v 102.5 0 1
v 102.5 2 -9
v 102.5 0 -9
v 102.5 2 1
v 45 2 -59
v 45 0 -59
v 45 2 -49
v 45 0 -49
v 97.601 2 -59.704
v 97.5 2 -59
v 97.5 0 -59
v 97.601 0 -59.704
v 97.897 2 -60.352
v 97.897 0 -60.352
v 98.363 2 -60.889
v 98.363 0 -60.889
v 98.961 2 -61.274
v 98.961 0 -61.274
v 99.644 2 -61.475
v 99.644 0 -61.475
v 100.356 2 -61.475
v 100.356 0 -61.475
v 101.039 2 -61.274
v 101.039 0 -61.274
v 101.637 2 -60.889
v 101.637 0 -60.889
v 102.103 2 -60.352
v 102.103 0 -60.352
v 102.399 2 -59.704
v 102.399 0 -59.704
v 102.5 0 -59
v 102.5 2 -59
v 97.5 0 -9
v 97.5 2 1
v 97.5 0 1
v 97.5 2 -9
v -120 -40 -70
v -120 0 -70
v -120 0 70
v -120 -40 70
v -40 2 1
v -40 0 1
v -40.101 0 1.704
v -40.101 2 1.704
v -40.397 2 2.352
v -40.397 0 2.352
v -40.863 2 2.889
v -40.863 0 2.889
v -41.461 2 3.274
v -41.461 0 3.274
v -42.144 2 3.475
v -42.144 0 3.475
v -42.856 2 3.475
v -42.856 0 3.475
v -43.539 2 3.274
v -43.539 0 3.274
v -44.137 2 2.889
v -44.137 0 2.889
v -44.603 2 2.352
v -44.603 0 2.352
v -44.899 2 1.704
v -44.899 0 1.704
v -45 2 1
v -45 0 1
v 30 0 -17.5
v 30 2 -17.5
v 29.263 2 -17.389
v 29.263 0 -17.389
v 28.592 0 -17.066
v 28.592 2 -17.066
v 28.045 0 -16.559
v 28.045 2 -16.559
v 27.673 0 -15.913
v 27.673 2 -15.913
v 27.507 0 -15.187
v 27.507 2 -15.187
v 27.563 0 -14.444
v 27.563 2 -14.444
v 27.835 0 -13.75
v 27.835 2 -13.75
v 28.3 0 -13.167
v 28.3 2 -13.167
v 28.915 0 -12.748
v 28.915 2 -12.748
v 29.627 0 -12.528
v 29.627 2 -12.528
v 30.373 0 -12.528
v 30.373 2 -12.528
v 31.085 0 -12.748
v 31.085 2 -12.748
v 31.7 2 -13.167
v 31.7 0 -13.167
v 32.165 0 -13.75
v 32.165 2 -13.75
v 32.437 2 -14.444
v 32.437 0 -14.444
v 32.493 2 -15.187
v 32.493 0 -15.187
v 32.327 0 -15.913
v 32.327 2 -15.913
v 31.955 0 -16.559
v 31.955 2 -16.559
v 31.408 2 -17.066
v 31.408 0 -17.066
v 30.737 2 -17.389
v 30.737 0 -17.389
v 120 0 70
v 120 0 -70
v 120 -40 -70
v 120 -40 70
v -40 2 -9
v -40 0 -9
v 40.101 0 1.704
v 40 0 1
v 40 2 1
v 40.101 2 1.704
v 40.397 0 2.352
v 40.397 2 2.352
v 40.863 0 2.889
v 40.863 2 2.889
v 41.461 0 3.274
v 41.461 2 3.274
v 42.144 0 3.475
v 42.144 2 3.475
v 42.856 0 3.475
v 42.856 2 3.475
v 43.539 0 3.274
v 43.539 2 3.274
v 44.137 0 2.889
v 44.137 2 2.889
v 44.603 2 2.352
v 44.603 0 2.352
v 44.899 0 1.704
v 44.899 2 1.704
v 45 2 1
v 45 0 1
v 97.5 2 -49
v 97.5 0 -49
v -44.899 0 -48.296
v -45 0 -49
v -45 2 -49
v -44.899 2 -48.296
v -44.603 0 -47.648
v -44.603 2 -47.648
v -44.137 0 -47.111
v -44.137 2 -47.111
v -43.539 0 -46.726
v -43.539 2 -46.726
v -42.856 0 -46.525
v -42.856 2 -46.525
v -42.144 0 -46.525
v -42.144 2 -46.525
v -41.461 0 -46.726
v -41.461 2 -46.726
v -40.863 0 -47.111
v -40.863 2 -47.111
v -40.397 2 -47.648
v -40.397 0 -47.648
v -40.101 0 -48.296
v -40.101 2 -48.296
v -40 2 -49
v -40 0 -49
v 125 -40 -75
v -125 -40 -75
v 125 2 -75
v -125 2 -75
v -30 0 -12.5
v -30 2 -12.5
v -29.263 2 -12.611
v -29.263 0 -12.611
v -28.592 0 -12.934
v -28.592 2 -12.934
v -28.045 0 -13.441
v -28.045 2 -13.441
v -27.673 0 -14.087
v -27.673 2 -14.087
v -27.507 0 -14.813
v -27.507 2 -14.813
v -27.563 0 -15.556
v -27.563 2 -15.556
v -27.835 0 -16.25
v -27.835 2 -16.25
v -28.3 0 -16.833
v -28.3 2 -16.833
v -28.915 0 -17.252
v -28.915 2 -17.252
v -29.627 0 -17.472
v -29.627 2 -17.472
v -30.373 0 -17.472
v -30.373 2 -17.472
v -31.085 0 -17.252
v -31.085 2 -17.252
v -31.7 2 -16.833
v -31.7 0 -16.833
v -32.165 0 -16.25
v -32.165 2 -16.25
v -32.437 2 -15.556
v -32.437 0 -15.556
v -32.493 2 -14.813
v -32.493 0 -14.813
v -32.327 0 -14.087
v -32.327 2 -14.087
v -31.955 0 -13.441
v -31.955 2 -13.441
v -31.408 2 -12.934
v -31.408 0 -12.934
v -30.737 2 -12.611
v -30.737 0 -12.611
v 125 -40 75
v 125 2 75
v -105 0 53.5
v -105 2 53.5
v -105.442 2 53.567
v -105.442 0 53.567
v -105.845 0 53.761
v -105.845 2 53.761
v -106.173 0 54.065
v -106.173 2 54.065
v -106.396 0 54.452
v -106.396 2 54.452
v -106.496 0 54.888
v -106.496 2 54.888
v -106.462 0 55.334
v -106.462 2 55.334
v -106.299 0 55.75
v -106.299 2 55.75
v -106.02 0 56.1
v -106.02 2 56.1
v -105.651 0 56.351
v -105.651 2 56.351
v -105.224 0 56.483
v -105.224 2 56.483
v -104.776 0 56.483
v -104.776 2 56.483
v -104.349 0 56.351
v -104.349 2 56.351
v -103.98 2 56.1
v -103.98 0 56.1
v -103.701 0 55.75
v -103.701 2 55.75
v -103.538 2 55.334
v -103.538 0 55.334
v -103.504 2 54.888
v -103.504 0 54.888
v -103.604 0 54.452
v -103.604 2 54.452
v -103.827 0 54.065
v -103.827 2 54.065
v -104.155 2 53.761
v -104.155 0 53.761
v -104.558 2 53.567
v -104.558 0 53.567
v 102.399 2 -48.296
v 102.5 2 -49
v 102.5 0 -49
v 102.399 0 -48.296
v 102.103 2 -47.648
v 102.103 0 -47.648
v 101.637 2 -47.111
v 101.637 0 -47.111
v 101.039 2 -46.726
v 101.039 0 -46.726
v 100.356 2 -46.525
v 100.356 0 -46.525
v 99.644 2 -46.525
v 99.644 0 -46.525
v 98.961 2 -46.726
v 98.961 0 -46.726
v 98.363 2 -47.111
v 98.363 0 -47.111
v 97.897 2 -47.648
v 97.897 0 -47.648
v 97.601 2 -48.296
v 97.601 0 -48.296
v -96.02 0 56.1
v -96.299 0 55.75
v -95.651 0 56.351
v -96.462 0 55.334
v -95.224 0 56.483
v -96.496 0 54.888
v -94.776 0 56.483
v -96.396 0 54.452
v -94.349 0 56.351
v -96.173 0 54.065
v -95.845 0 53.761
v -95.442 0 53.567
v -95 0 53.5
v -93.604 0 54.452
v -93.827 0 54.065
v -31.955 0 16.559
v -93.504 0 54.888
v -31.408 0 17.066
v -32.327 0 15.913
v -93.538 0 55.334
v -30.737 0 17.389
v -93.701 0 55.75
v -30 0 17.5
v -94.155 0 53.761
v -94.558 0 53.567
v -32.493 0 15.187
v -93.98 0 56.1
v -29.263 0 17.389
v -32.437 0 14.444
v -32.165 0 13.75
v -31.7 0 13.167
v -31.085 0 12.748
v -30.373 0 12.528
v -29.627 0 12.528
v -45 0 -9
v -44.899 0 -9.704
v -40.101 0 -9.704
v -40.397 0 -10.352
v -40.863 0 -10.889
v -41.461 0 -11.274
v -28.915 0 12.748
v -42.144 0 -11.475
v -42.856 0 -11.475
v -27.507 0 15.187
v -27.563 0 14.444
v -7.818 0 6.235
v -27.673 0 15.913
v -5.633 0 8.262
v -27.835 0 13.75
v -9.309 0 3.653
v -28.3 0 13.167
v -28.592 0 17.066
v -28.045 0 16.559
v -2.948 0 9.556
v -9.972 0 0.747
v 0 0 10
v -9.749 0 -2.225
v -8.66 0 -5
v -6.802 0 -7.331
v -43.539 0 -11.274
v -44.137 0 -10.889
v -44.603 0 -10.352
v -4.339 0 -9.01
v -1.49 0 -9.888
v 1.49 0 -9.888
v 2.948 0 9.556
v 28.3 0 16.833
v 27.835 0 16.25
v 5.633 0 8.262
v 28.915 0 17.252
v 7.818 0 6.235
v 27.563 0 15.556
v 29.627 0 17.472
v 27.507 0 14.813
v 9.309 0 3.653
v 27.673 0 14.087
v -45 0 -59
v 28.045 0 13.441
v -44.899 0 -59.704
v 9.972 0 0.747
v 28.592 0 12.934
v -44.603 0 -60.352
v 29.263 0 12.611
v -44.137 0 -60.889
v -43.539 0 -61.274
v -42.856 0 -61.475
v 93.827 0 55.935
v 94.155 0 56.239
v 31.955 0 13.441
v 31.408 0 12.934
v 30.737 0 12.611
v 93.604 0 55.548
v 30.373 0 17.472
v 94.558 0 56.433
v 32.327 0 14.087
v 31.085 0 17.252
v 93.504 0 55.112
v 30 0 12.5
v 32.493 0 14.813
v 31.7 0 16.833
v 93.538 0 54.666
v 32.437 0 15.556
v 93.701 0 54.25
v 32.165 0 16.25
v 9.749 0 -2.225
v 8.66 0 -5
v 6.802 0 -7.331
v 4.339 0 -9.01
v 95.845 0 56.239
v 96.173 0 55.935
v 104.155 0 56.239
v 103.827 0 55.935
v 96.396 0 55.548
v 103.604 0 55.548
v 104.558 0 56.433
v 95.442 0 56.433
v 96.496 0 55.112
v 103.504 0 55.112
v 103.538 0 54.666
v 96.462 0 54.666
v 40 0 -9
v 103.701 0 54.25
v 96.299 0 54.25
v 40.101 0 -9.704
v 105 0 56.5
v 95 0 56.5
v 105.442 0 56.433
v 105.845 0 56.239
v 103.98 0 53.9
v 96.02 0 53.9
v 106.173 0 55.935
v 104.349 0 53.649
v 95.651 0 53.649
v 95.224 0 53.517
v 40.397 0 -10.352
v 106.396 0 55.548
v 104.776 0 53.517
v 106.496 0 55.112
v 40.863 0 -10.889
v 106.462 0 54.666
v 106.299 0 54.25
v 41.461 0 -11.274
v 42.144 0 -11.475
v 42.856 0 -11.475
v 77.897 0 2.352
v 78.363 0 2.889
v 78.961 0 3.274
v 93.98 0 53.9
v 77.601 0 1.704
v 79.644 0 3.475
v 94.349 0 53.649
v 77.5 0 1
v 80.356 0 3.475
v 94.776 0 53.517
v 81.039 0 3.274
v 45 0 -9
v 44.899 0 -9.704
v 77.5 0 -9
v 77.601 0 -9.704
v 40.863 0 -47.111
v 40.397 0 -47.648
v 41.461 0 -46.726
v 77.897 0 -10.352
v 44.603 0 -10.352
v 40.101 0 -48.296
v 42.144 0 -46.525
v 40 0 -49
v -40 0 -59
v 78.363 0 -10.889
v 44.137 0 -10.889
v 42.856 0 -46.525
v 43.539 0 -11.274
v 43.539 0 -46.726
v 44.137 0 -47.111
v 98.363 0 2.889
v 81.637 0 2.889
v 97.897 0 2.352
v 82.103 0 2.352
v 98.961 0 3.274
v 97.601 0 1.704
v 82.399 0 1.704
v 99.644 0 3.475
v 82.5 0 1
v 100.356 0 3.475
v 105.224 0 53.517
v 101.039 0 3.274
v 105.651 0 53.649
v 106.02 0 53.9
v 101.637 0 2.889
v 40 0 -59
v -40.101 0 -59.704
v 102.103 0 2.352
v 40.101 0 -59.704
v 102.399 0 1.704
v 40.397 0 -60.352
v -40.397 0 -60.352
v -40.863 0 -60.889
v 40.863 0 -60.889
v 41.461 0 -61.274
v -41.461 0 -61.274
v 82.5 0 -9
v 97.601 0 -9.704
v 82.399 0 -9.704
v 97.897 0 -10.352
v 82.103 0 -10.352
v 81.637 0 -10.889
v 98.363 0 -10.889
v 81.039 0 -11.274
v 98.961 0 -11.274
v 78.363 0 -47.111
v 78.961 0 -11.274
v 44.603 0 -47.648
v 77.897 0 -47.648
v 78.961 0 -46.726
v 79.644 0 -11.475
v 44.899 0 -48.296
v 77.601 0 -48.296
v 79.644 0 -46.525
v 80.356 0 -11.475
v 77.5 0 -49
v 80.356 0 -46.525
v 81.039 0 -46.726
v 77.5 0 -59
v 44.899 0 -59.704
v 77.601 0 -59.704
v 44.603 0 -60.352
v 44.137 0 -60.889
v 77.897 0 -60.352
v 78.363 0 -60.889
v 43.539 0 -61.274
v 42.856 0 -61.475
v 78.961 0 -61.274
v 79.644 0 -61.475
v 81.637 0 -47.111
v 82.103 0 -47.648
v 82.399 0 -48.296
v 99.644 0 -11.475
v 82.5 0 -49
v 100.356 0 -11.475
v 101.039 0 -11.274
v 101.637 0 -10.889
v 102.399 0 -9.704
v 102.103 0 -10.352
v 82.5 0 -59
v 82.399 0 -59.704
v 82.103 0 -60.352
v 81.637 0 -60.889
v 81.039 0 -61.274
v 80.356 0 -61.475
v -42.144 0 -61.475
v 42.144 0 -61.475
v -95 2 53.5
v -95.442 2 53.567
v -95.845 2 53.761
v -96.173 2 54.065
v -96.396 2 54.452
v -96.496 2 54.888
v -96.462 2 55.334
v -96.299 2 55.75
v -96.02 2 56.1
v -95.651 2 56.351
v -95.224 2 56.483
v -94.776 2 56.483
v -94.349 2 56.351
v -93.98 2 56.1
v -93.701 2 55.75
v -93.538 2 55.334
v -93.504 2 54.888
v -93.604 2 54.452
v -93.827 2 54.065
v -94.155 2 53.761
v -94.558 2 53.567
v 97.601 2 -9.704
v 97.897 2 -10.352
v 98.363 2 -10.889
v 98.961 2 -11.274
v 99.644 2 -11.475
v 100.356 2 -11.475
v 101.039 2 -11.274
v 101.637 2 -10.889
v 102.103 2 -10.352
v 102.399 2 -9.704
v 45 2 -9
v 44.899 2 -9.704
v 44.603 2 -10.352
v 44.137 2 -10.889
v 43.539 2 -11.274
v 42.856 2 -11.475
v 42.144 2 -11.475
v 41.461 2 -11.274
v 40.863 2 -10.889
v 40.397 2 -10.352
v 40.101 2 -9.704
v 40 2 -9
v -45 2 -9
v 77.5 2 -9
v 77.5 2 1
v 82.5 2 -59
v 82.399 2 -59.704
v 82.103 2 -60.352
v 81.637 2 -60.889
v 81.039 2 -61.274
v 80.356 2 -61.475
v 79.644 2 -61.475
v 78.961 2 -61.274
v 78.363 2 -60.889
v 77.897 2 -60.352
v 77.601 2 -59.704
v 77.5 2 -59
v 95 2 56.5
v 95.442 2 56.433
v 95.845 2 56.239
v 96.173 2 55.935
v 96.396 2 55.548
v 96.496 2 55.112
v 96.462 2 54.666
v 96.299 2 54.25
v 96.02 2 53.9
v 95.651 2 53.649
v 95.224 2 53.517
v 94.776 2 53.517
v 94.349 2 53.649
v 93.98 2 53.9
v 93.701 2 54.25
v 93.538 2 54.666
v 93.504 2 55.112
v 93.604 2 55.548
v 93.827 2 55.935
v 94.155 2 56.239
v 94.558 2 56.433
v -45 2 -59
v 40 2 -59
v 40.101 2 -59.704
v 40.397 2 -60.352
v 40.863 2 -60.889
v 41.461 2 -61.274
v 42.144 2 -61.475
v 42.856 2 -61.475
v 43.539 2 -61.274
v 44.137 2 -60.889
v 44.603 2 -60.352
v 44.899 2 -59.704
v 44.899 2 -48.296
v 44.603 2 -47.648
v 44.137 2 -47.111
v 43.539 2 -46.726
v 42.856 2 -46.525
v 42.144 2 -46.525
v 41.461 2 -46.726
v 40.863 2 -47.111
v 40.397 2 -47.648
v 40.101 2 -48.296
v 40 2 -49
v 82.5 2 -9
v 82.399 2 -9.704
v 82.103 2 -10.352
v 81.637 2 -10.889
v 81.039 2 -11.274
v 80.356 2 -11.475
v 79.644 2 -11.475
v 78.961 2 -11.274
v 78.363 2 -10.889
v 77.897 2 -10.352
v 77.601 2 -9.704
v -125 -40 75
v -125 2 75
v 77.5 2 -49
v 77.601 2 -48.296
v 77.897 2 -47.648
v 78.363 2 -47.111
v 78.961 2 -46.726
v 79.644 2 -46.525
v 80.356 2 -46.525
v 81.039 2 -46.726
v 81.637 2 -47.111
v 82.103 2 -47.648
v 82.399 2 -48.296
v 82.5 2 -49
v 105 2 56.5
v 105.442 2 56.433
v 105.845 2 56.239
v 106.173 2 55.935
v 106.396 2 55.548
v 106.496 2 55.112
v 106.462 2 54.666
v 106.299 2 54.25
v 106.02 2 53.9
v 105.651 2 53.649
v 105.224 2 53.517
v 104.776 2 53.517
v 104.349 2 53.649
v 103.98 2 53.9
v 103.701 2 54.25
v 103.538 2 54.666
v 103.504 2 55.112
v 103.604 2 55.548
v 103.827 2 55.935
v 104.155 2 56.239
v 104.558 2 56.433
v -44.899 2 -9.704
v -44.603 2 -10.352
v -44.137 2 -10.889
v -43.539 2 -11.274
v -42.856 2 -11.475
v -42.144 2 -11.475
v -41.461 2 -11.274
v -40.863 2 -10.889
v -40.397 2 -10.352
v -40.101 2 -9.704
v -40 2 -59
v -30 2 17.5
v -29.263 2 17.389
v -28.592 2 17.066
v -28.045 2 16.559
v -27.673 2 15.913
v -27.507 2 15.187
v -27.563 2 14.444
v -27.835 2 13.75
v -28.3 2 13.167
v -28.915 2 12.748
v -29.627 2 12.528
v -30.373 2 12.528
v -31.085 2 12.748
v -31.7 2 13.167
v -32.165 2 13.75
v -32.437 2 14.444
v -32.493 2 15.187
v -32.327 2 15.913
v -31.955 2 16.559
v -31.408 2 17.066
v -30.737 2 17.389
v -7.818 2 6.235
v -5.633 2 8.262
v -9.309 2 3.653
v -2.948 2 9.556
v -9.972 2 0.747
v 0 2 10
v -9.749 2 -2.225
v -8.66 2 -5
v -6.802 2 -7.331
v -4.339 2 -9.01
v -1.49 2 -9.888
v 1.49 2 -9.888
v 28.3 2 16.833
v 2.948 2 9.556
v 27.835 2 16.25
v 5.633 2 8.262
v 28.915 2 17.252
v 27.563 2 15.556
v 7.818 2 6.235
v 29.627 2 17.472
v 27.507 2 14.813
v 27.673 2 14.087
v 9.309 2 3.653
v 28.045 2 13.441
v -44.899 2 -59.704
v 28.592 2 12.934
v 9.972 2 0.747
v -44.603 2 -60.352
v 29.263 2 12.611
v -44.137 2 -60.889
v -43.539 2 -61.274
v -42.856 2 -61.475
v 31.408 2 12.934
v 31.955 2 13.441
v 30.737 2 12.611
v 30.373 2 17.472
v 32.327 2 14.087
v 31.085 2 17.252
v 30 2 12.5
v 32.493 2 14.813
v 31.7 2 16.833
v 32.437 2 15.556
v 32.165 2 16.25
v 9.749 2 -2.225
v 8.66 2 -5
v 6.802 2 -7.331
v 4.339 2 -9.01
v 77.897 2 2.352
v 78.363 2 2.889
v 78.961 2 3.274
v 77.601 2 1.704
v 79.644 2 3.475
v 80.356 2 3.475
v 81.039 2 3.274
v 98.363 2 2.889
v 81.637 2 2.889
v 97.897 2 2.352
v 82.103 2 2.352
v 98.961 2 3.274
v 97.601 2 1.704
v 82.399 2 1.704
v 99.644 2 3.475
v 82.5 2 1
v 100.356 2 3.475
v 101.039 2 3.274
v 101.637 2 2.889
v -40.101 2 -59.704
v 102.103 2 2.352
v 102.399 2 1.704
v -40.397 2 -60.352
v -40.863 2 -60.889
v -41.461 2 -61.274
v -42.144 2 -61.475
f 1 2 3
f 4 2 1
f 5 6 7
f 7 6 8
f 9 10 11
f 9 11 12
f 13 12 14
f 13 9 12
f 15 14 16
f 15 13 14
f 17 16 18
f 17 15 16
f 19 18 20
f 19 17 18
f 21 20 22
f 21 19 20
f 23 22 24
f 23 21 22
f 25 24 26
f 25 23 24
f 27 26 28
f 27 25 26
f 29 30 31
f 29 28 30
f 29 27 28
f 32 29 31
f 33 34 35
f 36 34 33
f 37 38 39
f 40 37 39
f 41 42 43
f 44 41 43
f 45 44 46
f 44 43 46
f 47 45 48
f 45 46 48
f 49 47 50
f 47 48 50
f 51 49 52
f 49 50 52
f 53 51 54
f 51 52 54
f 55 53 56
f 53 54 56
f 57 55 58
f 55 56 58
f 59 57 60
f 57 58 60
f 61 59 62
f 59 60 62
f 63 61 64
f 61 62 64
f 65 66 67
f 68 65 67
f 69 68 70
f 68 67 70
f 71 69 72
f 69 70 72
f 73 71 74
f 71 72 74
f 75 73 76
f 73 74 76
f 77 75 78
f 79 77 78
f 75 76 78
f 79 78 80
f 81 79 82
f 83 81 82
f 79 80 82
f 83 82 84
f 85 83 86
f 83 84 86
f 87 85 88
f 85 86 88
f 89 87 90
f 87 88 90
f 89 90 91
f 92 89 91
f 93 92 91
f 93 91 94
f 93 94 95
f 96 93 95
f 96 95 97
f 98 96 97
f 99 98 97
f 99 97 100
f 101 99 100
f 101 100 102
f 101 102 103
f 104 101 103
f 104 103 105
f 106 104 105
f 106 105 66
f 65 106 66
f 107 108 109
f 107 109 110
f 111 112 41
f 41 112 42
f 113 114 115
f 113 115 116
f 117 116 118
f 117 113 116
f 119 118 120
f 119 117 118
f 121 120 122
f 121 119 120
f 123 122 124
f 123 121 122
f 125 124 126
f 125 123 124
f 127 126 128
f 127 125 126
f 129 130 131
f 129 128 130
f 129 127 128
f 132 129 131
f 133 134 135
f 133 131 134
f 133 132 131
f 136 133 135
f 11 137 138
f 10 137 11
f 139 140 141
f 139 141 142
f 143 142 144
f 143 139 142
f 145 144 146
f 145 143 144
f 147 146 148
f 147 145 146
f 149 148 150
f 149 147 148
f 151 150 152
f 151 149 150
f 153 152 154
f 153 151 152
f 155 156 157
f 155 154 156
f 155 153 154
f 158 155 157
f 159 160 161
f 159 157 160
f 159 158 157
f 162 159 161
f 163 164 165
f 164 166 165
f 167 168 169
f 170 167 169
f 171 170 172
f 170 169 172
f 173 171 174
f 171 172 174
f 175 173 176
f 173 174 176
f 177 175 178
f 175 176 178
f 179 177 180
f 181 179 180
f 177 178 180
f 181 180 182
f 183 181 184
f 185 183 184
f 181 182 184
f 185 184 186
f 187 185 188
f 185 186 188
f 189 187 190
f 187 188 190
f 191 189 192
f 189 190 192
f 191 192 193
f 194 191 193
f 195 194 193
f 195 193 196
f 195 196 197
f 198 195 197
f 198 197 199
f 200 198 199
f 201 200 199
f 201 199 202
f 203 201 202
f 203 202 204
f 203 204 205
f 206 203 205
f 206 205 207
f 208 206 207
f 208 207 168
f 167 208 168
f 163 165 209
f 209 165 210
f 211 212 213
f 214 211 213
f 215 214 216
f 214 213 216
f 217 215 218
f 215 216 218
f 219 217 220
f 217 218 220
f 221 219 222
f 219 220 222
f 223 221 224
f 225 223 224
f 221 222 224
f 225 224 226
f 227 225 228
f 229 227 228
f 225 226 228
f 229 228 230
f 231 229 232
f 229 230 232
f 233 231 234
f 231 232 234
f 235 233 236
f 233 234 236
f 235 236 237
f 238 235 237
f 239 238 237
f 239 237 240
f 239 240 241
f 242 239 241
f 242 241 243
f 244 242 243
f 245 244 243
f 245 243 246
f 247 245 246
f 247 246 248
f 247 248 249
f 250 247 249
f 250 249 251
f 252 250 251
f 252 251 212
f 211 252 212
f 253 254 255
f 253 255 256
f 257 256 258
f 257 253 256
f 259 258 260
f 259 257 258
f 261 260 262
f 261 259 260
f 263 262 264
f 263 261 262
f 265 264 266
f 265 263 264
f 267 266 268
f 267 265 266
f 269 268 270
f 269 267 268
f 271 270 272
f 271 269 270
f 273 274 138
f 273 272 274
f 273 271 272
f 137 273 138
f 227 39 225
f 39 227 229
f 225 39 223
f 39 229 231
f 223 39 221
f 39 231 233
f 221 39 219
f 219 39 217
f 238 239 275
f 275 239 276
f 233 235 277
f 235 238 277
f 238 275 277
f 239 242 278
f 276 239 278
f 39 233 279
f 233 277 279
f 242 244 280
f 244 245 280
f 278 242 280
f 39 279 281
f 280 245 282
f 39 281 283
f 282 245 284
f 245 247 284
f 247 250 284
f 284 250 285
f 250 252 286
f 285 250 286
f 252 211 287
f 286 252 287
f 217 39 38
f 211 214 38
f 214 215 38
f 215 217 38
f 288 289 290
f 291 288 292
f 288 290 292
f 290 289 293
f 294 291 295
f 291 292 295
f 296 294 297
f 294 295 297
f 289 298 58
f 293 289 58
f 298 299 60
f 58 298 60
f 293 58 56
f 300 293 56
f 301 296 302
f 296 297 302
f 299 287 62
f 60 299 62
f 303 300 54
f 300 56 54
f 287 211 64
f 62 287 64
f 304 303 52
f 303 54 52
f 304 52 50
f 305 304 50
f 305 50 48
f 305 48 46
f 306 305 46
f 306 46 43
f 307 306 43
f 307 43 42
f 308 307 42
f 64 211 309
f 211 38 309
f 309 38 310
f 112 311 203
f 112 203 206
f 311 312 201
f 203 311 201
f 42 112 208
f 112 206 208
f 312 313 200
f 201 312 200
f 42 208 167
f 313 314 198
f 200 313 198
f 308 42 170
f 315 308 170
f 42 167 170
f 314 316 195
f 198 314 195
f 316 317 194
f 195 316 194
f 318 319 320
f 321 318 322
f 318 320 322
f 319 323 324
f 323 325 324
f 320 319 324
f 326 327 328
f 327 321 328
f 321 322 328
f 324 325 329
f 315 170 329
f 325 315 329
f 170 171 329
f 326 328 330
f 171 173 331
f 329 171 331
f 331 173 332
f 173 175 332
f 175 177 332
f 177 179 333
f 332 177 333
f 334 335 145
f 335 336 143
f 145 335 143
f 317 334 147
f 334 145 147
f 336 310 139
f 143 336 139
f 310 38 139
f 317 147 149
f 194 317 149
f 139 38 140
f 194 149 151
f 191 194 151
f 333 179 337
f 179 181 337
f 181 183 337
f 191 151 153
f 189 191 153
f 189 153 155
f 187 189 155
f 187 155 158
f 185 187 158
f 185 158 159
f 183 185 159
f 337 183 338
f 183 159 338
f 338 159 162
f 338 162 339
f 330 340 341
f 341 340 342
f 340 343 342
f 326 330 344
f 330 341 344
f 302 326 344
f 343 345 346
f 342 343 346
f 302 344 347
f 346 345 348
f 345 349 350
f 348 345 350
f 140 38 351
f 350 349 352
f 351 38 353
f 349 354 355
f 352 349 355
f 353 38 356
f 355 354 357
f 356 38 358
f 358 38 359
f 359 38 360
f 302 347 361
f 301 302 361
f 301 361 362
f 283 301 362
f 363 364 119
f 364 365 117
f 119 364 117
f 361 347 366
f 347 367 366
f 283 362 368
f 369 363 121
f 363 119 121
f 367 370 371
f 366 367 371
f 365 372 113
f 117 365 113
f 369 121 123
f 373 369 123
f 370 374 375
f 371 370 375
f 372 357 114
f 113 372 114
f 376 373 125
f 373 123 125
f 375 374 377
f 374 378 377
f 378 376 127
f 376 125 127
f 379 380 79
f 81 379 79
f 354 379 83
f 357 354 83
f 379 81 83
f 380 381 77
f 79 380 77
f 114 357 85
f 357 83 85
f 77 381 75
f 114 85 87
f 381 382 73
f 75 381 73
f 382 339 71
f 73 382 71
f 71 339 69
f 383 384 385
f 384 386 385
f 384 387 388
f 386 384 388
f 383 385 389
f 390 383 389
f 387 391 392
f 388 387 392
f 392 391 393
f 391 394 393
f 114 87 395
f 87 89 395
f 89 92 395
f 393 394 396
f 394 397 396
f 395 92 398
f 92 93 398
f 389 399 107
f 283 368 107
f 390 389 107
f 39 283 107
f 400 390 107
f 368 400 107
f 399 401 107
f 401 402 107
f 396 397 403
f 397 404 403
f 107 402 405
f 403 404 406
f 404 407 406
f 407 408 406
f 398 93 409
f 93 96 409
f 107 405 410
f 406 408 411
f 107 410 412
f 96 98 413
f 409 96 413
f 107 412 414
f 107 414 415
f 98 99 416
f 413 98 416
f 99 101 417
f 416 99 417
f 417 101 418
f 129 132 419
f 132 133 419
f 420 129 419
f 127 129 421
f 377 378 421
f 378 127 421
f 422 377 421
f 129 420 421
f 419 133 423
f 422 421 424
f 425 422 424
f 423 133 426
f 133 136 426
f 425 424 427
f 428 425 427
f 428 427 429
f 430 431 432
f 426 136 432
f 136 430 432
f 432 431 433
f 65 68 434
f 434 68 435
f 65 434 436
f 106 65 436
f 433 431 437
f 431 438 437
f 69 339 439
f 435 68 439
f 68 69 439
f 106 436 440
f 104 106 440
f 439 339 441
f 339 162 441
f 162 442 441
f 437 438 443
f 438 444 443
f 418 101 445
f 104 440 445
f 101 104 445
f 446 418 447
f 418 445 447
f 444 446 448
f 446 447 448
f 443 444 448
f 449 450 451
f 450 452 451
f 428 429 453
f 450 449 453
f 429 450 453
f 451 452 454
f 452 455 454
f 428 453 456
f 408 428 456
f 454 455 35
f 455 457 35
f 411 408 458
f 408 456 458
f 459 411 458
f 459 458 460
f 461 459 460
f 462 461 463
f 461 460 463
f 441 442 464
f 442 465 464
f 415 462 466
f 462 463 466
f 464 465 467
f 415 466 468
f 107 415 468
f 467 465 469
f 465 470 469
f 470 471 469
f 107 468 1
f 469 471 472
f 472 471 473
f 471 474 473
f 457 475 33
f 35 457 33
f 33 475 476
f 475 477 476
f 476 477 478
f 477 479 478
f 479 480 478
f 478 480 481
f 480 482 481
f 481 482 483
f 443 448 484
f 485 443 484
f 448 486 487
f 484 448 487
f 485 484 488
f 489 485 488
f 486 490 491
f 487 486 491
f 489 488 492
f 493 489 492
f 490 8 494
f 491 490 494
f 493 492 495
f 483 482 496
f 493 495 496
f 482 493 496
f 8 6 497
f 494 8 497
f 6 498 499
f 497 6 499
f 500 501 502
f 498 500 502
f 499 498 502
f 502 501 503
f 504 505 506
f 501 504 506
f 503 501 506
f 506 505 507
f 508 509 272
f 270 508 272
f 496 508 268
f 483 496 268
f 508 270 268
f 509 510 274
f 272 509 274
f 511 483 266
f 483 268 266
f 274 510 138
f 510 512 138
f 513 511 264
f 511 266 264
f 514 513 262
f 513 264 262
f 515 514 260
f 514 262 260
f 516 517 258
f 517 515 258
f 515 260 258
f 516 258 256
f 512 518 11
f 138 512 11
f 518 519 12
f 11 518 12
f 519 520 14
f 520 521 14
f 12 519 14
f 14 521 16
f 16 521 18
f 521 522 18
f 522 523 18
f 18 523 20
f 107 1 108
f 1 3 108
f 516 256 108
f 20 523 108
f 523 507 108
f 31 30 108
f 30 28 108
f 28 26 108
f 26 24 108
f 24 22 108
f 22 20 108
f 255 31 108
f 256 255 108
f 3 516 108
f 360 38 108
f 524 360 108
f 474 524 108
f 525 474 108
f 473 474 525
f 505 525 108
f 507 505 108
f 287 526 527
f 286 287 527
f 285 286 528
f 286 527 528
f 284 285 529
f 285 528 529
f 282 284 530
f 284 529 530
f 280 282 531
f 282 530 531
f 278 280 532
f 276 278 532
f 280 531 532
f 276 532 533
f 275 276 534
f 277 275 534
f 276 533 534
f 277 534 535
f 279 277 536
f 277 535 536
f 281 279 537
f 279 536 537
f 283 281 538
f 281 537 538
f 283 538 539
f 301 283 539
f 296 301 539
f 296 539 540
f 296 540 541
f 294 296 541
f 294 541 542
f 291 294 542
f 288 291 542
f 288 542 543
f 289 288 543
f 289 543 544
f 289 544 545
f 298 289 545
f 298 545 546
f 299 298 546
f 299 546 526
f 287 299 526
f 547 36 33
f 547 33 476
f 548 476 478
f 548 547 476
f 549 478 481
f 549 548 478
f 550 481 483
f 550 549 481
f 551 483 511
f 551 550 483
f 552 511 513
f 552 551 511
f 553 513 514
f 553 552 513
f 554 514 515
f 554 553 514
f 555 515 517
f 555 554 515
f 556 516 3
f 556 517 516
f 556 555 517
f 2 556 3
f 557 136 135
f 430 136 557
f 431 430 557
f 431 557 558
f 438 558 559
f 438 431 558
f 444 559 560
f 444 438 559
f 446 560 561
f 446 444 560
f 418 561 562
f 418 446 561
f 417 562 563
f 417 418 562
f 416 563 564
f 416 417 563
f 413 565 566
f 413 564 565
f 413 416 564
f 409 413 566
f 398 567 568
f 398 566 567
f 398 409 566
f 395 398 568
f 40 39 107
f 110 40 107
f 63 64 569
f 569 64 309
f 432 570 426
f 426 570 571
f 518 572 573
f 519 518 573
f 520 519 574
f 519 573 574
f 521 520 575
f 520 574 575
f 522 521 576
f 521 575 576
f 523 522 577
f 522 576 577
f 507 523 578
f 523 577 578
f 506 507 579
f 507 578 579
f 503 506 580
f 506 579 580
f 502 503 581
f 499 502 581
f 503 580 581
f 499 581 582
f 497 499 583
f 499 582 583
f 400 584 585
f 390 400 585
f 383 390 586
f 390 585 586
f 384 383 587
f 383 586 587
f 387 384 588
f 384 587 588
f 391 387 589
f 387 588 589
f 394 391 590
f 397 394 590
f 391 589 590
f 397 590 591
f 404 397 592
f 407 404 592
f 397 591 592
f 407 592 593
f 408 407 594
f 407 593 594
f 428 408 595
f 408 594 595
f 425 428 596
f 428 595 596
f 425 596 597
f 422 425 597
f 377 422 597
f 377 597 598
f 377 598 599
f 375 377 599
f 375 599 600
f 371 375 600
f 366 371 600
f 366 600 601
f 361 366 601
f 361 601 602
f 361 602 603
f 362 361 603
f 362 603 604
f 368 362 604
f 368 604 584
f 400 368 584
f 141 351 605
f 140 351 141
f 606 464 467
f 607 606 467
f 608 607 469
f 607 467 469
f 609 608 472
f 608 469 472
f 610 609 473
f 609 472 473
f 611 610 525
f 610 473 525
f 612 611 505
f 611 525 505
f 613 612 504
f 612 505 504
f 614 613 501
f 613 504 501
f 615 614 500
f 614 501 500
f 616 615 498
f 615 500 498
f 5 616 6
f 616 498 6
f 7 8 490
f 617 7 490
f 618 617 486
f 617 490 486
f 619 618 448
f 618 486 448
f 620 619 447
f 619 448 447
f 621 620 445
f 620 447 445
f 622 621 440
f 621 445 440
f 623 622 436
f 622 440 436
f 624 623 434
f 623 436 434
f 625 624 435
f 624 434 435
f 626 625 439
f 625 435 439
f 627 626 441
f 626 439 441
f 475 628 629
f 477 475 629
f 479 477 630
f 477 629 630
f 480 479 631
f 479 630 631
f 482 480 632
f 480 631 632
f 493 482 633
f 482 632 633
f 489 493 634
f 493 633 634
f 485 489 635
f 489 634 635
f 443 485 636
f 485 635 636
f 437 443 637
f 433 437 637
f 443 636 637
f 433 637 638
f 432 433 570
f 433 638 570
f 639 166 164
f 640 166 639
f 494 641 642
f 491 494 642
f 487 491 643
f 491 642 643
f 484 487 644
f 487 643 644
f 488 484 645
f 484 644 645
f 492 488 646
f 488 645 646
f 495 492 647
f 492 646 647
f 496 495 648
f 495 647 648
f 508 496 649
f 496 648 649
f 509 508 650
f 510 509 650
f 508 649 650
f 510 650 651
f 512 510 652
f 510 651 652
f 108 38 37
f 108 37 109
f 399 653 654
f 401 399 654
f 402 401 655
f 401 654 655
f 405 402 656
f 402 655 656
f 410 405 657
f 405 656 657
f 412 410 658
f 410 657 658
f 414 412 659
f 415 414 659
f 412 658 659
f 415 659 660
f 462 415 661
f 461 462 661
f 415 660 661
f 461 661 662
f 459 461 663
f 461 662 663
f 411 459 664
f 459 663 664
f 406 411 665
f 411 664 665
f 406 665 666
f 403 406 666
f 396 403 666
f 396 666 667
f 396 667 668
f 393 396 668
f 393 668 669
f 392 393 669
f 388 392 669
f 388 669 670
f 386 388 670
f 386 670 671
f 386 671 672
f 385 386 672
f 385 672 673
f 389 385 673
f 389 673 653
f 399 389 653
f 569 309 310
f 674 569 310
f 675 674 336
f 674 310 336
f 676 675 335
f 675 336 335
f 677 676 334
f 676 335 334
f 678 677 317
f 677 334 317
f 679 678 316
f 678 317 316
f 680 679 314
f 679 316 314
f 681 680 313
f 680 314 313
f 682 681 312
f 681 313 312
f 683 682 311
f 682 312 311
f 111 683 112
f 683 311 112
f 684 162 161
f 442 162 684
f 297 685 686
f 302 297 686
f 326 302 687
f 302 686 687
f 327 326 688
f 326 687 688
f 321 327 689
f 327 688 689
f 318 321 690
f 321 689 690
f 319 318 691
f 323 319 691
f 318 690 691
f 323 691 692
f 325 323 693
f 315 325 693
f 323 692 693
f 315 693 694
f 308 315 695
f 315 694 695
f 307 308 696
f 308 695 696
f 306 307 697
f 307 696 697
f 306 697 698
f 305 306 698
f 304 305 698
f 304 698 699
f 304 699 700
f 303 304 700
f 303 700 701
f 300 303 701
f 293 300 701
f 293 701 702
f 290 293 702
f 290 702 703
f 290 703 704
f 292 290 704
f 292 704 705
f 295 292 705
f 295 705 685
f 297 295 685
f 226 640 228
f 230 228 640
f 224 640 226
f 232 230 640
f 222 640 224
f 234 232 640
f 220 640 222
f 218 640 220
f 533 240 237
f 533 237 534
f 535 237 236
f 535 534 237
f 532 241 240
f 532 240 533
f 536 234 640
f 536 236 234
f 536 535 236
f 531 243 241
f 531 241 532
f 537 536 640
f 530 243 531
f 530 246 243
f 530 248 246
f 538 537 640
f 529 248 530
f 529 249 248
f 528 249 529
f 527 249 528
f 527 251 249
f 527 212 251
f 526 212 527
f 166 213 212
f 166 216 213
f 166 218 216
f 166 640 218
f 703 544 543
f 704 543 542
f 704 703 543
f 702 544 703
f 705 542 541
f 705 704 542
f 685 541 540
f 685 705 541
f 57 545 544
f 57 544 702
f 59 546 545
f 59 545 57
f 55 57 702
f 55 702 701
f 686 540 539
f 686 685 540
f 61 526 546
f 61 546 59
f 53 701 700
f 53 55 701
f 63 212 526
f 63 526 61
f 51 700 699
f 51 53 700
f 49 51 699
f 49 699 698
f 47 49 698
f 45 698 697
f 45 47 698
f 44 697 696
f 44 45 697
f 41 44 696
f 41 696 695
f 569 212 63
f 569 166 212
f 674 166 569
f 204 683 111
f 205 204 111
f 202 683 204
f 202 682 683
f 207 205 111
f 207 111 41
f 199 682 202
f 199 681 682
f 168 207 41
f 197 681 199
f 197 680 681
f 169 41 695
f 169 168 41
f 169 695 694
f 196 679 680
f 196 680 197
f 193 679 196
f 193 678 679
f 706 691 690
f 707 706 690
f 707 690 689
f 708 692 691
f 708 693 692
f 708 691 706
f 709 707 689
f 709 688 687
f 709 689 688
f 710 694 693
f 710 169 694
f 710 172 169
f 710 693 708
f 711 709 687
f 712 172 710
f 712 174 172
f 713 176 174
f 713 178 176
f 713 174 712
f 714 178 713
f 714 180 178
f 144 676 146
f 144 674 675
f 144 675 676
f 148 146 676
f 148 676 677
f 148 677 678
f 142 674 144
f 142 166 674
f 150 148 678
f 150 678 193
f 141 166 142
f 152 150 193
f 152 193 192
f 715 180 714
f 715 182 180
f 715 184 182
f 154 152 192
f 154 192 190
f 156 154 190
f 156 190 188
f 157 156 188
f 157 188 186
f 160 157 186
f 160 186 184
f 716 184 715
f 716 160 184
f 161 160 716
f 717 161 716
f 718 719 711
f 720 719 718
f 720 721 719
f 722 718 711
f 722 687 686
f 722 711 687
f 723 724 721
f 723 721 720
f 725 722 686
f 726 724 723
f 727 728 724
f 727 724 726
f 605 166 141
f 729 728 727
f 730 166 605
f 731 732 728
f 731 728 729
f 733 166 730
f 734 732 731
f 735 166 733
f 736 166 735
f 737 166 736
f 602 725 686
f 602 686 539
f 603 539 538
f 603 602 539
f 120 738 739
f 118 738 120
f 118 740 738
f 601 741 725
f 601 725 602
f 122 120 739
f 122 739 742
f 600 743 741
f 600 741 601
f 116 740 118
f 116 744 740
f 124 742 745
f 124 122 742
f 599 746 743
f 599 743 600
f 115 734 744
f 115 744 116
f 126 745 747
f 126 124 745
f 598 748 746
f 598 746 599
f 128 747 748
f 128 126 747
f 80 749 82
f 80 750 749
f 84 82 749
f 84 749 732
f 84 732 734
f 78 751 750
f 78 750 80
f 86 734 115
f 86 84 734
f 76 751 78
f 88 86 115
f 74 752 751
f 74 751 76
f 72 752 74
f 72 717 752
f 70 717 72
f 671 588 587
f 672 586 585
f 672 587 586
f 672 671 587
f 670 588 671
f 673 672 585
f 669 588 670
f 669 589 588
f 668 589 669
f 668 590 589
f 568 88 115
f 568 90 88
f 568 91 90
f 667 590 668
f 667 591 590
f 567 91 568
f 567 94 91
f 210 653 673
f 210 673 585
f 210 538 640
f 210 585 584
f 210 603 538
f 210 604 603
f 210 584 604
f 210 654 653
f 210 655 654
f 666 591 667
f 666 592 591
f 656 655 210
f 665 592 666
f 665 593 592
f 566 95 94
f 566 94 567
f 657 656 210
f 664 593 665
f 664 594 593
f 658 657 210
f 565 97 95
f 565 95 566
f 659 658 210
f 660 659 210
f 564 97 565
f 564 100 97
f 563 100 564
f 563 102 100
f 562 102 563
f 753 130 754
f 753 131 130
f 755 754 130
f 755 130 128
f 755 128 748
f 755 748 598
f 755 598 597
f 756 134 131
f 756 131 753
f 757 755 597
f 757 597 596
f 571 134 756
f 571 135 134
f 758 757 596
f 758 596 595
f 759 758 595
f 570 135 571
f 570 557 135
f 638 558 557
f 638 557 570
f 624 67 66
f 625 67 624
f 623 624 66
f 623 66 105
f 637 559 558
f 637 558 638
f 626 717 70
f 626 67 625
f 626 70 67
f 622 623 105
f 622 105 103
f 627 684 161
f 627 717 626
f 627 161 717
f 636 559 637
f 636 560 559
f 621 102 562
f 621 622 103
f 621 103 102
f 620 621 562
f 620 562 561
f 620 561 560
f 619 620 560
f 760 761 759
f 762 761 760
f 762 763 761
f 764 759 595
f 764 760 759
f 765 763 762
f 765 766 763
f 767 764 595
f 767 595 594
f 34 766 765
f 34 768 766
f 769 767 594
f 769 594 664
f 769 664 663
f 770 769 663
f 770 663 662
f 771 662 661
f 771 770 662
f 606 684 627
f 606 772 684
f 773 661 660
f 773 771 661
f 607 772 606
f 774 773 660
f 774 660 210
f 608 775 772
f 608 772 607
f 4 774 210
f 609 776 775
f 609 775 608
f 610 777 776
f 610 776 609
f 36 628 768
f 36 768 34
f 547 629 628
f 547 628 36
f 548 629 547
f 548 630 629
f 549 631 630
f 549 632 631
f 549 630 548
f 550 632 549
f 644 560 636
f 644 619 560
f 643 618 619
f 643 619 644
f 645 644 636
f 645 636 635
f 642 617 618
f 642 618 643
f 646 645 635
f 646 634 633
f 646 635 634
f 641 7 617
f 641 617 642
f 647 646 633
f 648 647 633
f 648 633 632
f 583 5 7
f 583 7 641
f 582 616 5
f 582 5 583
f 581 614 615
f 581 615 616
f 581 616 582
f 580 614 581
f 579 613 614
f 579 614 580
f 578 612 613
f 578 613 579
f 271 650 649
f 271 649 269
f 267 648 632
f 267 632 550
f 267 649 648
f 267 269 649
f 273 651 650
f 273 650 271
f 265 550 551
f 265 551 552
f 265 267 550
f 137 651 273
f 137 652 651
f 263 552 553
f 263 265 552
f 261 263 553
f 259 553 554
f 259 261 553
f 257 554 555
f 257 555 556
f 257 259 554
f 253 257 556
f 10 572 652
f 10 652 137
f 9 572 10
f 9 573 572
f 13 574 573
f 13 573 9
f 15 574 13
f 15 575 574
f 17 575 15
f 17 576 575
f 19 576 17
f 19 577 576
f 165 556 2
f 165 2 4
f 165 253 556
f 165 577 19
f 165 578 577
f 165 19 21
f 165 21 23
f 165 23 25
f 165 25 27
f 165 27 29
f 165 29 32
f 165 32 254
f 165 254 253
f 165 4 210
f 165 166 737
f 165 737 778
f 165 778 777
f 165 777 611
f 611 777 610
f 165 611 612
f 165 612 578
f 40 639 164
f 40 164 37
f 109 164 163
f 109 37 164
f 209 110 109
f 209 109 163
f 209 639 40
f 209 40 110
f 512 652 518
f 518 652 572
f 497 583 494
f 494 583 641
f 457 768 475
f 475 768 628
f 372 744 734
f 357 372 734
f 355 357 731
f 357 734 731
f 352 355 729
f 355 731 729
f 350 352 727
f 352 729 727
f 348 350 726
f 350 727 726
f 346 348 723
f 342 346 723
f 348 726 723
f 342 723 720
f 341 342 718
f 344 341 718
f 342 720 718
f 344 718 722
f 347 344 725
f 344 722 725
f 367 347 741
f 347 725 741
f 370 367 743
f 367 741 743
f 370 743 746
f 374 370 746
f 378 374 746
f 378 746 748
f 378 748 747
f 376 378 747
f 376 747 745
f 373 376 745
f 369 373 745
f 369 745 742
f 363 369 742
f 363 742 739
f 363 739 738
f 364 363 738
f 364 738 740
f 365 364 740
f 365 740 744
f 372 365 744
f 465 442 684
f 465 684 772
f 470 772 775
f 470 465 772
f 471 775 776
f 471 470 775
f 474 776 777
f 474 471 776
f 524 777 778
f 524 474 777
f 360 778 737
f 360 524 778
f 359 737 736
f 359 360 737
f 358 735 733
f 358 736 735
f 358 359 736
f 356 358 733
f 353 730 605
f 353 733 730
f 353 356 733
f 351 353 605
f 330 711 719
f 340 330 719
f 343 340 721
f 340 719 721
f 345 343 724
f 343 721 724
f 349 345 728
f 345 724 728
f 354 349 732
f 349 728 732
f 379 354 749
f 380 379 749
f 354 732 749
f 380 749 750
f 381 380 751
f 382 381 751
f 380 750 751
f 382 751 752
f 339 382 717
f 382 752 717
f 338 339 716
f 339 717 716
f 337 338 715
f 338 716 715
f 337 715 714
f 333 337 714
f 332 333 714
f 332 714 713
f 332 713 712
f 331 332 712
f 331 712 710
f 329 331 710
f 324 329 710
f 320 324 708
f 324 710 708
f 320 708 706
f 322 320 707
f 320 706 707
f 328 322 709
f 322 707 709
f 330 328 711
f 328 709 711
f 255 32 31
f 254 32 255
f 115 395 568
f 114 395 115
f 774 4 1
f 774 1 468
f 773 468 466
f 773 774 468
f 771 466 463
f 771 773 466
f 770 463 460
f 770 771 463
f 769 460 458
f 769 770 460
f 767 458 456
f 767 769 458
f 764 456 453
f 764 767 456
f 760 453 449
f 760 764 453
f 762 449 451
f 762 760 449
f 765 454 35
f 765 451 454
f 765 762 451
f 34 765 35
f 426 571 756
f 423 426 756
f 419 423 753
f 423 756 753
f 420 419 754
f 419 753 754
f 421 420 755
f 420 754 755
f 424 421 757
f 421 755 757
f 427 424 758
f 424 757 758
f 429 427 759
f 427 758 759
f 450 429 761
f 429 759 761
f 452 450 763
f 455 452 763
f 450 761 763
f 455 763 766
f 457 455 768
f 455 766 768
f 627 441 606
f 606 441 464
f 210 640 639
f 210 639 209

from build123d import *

# Parameters (mm, degrees)
SKETCH1_W           = 250
SKETCH1_H           = 150
BOSS_EXTRUDE1_DEPTH = 2
SKETCH2_R           = 10
CUT_EXTRUDE1_DEPTH  = 2
CUT_EXTRUDE46_DEPTH = 10
CUT_EXTRUDE59_DEPTH = 10
SKETCH9_R           = 2.5
CUT_EXTRUDE60_DEPTH = 10
SKETCH19_R          = 1.5
CUT_EXTRUDE63_DEPTH = 10
SKETCH20_W          = 250
SKETCH20_H          = 150
SKETCH20_W_2        = 240
SKETCH20_H_2        = 140
BOSS_EXTRUDE5_DEPTH = 40


with BuildPart() as part:
    # Sketch1 → Boss-Extrude1 (new body)
    with BuildSketch(Plane(origin=(0, 0, 0), x_dir=(1, 0, 0), z_dir=(0, 1, 0))):
        Rectangle(SKETCH1_W, SKETCH1_H)
    extrude(amount=BOSS_EXTRUDE1_DEPTH)

    # Sketch2 → Cut-Extrude1 (cut)
    with BuildSketch(Plane(origin=(0, 2, 0), x_dir=(1, 0, 0), z_dir=(0, 1, 0))):
        with Locations(Location((0, 0, 0), (0, 0, 270))):
            Circle(SKETCH2_R)
    extrude(amount=-CUT_EXTRUDE1_DEPTH, mode=Mode.SUBTRACT)

    # Sketch7 → Cut-Extrude46 (cut)
    with BuildSketch(Plane(origin=(0, 2, 0), x_dir=(1, 0, 0), z_dir=(0, 1, 0))):
        with BuildLine():
            Line((102.5, 59), (102.5, 49))
            ThreePointArc((102.5, 49), (100, 46.5), (97.5, 49))
            Line((97.5, 49), (97.5, 59))
            ThreePointArc((97.5, 59), (100, 61.5), (102.5, 59))
        make_face()
        with BuildLine():
            Line((77.5, 59), (77.5, 49))
            ThreePointArc((77.5, 49), (80, 46.5), (82.5, 49))
            Line((82.5, 49), (82.5, 59))
            ThreePointArc((82.5, 59), (80, 61.5), (77.5, 59))
        make_face()
        with BuildLine():
            Line((82.5, -1), (82.5, 9))
            ThreePointArc((82.5, 9), (80, 11.5), (77.5, 9))
            Line((77.5, 9), (77.5, -1))
            ThreePointArc((77.5, -1), (80, -3.5), (82.5, -1))
        make_face()
        with BuildLine():
            Line((97.5, -1), (97.5, 9))
            ThreePointArc((97.5, 9), (100, 11.5), (102.5, 9))
            Line((102.5, 9), (102.5, -1))
            ThreePointArc((102.5, -1), (100, -3.5), (97.5, -1))
        make_face()
    extrude(amount=-CUT_EXTRUDE46_DEPTH, mode=Mode.SUBTRACT)

    # Sketch3 → Cut-Extrude59 (cut)
    with BuildSketch(Plane.XZ):
        with BuildLine():
            Line((-40, -9), (-40, 1))
            ThreePointArc((-40, 1), (-42.5, 3.5), (-45, 1))
            Line((-45, 1), (-45, -9))
            ThreePointArc((-45, -9), (-42.5, -11.5), (-40, -9))
        make_face()
        with BuildLine():
            Line((-40, -49), (-40, -59))
            ThreePointArc((-40, -59), (-42.5, -61.5), (-45, -59))
            Line((-45, -59), (-45, -49))
            ThreePointArc((-45, -49), (-42.5, -46.5), (-40, -49))
        make_face()
        with BuildLine():
            Line((40, -9), (40, 1))
            ThreePointArc((40, 1), (42.5, 3.5), (45, 1))
            Line((45, 1), (45, -9))
            ThreePointArc((45, -9), (42.5, -11.5), (40, -9))
        make_face()
        with BuildLine():
            Line((40, -49), (40, -59))
            ThreePointArc((40, -59), (42.5, -61.5), (45, -59))
            Line((45, -59), (45, -49))
            ThreePointArc((45, -49), (42.5, -46.5), (40, -49))
        make_face()
    extrude(amount=-CUT_EXTRUDE59_DEPTH, mode=Mode.SUBTRACT)

    # Sketch9 → Cut-Extrude60 (cut)
    with BuildSketch(Plane(origin=(0, 2, 0), x_dir=(1, 0, 0), z_dir=(0, 1, 0))):
        with Locations(Location((-30, 15, 0), (0, 0, 270))):
            Circle(SKETCH9_R)
        with Locations(Location((-30, -15, 0), (0, 0, 270))):
            Circle(SKETCH9_R)
        with Locations(Location((30, -15, 0), (0, 0, 90))):
            Circle(SKETCH9_R)
        with Locations(Location((30, 15, 0), (0, 0, 90))):
            Circle(SKETCH9_R)
    extrude(amount=-CUT_EXTRUDE60_DEPTH, mode=Mode.SUBTRACT)

    # Sketch19 → Cut-Extrude63 (cut)
    with BuildSketch(Plane(origin=(0, 2, 0), x_dir=(1, 0, 0), z_dir=(0, 1, 0))):
        with Locations(Location((105, -55, 0), (0, 0, 270))):
            Circle(SKETCH19_R)
        with Locations(Location((95, -55, 0), (0, 0, 270))):
            Circle(SKETCH19_R)
        with Locations(Location((-95, -55, 0), (0, 0, 90))):
            Circle(SKETCH19_R)
        with Locations(Location((-105, -55, 0), (0, 0, 90))):
            Circle(SKETCH19_R)
    extrude(amount=-CUT_EXTRUDE63_DEPTH, mode=Mode.SUBTRACT)

    # Sketch20 → Boss-Extrude5 (add)
    with BuildSketch(Plane.XZ):
        Rectangle(SKETCH20_W, SKETCH20_H)
        Rectangle(SKETCH20_W_2, SKETCH20_H_2, mode=Mode.SUBTRACT)
    extrude(amount=BOSS_EXTRUDE5_DEPTH)


solid = part.part
